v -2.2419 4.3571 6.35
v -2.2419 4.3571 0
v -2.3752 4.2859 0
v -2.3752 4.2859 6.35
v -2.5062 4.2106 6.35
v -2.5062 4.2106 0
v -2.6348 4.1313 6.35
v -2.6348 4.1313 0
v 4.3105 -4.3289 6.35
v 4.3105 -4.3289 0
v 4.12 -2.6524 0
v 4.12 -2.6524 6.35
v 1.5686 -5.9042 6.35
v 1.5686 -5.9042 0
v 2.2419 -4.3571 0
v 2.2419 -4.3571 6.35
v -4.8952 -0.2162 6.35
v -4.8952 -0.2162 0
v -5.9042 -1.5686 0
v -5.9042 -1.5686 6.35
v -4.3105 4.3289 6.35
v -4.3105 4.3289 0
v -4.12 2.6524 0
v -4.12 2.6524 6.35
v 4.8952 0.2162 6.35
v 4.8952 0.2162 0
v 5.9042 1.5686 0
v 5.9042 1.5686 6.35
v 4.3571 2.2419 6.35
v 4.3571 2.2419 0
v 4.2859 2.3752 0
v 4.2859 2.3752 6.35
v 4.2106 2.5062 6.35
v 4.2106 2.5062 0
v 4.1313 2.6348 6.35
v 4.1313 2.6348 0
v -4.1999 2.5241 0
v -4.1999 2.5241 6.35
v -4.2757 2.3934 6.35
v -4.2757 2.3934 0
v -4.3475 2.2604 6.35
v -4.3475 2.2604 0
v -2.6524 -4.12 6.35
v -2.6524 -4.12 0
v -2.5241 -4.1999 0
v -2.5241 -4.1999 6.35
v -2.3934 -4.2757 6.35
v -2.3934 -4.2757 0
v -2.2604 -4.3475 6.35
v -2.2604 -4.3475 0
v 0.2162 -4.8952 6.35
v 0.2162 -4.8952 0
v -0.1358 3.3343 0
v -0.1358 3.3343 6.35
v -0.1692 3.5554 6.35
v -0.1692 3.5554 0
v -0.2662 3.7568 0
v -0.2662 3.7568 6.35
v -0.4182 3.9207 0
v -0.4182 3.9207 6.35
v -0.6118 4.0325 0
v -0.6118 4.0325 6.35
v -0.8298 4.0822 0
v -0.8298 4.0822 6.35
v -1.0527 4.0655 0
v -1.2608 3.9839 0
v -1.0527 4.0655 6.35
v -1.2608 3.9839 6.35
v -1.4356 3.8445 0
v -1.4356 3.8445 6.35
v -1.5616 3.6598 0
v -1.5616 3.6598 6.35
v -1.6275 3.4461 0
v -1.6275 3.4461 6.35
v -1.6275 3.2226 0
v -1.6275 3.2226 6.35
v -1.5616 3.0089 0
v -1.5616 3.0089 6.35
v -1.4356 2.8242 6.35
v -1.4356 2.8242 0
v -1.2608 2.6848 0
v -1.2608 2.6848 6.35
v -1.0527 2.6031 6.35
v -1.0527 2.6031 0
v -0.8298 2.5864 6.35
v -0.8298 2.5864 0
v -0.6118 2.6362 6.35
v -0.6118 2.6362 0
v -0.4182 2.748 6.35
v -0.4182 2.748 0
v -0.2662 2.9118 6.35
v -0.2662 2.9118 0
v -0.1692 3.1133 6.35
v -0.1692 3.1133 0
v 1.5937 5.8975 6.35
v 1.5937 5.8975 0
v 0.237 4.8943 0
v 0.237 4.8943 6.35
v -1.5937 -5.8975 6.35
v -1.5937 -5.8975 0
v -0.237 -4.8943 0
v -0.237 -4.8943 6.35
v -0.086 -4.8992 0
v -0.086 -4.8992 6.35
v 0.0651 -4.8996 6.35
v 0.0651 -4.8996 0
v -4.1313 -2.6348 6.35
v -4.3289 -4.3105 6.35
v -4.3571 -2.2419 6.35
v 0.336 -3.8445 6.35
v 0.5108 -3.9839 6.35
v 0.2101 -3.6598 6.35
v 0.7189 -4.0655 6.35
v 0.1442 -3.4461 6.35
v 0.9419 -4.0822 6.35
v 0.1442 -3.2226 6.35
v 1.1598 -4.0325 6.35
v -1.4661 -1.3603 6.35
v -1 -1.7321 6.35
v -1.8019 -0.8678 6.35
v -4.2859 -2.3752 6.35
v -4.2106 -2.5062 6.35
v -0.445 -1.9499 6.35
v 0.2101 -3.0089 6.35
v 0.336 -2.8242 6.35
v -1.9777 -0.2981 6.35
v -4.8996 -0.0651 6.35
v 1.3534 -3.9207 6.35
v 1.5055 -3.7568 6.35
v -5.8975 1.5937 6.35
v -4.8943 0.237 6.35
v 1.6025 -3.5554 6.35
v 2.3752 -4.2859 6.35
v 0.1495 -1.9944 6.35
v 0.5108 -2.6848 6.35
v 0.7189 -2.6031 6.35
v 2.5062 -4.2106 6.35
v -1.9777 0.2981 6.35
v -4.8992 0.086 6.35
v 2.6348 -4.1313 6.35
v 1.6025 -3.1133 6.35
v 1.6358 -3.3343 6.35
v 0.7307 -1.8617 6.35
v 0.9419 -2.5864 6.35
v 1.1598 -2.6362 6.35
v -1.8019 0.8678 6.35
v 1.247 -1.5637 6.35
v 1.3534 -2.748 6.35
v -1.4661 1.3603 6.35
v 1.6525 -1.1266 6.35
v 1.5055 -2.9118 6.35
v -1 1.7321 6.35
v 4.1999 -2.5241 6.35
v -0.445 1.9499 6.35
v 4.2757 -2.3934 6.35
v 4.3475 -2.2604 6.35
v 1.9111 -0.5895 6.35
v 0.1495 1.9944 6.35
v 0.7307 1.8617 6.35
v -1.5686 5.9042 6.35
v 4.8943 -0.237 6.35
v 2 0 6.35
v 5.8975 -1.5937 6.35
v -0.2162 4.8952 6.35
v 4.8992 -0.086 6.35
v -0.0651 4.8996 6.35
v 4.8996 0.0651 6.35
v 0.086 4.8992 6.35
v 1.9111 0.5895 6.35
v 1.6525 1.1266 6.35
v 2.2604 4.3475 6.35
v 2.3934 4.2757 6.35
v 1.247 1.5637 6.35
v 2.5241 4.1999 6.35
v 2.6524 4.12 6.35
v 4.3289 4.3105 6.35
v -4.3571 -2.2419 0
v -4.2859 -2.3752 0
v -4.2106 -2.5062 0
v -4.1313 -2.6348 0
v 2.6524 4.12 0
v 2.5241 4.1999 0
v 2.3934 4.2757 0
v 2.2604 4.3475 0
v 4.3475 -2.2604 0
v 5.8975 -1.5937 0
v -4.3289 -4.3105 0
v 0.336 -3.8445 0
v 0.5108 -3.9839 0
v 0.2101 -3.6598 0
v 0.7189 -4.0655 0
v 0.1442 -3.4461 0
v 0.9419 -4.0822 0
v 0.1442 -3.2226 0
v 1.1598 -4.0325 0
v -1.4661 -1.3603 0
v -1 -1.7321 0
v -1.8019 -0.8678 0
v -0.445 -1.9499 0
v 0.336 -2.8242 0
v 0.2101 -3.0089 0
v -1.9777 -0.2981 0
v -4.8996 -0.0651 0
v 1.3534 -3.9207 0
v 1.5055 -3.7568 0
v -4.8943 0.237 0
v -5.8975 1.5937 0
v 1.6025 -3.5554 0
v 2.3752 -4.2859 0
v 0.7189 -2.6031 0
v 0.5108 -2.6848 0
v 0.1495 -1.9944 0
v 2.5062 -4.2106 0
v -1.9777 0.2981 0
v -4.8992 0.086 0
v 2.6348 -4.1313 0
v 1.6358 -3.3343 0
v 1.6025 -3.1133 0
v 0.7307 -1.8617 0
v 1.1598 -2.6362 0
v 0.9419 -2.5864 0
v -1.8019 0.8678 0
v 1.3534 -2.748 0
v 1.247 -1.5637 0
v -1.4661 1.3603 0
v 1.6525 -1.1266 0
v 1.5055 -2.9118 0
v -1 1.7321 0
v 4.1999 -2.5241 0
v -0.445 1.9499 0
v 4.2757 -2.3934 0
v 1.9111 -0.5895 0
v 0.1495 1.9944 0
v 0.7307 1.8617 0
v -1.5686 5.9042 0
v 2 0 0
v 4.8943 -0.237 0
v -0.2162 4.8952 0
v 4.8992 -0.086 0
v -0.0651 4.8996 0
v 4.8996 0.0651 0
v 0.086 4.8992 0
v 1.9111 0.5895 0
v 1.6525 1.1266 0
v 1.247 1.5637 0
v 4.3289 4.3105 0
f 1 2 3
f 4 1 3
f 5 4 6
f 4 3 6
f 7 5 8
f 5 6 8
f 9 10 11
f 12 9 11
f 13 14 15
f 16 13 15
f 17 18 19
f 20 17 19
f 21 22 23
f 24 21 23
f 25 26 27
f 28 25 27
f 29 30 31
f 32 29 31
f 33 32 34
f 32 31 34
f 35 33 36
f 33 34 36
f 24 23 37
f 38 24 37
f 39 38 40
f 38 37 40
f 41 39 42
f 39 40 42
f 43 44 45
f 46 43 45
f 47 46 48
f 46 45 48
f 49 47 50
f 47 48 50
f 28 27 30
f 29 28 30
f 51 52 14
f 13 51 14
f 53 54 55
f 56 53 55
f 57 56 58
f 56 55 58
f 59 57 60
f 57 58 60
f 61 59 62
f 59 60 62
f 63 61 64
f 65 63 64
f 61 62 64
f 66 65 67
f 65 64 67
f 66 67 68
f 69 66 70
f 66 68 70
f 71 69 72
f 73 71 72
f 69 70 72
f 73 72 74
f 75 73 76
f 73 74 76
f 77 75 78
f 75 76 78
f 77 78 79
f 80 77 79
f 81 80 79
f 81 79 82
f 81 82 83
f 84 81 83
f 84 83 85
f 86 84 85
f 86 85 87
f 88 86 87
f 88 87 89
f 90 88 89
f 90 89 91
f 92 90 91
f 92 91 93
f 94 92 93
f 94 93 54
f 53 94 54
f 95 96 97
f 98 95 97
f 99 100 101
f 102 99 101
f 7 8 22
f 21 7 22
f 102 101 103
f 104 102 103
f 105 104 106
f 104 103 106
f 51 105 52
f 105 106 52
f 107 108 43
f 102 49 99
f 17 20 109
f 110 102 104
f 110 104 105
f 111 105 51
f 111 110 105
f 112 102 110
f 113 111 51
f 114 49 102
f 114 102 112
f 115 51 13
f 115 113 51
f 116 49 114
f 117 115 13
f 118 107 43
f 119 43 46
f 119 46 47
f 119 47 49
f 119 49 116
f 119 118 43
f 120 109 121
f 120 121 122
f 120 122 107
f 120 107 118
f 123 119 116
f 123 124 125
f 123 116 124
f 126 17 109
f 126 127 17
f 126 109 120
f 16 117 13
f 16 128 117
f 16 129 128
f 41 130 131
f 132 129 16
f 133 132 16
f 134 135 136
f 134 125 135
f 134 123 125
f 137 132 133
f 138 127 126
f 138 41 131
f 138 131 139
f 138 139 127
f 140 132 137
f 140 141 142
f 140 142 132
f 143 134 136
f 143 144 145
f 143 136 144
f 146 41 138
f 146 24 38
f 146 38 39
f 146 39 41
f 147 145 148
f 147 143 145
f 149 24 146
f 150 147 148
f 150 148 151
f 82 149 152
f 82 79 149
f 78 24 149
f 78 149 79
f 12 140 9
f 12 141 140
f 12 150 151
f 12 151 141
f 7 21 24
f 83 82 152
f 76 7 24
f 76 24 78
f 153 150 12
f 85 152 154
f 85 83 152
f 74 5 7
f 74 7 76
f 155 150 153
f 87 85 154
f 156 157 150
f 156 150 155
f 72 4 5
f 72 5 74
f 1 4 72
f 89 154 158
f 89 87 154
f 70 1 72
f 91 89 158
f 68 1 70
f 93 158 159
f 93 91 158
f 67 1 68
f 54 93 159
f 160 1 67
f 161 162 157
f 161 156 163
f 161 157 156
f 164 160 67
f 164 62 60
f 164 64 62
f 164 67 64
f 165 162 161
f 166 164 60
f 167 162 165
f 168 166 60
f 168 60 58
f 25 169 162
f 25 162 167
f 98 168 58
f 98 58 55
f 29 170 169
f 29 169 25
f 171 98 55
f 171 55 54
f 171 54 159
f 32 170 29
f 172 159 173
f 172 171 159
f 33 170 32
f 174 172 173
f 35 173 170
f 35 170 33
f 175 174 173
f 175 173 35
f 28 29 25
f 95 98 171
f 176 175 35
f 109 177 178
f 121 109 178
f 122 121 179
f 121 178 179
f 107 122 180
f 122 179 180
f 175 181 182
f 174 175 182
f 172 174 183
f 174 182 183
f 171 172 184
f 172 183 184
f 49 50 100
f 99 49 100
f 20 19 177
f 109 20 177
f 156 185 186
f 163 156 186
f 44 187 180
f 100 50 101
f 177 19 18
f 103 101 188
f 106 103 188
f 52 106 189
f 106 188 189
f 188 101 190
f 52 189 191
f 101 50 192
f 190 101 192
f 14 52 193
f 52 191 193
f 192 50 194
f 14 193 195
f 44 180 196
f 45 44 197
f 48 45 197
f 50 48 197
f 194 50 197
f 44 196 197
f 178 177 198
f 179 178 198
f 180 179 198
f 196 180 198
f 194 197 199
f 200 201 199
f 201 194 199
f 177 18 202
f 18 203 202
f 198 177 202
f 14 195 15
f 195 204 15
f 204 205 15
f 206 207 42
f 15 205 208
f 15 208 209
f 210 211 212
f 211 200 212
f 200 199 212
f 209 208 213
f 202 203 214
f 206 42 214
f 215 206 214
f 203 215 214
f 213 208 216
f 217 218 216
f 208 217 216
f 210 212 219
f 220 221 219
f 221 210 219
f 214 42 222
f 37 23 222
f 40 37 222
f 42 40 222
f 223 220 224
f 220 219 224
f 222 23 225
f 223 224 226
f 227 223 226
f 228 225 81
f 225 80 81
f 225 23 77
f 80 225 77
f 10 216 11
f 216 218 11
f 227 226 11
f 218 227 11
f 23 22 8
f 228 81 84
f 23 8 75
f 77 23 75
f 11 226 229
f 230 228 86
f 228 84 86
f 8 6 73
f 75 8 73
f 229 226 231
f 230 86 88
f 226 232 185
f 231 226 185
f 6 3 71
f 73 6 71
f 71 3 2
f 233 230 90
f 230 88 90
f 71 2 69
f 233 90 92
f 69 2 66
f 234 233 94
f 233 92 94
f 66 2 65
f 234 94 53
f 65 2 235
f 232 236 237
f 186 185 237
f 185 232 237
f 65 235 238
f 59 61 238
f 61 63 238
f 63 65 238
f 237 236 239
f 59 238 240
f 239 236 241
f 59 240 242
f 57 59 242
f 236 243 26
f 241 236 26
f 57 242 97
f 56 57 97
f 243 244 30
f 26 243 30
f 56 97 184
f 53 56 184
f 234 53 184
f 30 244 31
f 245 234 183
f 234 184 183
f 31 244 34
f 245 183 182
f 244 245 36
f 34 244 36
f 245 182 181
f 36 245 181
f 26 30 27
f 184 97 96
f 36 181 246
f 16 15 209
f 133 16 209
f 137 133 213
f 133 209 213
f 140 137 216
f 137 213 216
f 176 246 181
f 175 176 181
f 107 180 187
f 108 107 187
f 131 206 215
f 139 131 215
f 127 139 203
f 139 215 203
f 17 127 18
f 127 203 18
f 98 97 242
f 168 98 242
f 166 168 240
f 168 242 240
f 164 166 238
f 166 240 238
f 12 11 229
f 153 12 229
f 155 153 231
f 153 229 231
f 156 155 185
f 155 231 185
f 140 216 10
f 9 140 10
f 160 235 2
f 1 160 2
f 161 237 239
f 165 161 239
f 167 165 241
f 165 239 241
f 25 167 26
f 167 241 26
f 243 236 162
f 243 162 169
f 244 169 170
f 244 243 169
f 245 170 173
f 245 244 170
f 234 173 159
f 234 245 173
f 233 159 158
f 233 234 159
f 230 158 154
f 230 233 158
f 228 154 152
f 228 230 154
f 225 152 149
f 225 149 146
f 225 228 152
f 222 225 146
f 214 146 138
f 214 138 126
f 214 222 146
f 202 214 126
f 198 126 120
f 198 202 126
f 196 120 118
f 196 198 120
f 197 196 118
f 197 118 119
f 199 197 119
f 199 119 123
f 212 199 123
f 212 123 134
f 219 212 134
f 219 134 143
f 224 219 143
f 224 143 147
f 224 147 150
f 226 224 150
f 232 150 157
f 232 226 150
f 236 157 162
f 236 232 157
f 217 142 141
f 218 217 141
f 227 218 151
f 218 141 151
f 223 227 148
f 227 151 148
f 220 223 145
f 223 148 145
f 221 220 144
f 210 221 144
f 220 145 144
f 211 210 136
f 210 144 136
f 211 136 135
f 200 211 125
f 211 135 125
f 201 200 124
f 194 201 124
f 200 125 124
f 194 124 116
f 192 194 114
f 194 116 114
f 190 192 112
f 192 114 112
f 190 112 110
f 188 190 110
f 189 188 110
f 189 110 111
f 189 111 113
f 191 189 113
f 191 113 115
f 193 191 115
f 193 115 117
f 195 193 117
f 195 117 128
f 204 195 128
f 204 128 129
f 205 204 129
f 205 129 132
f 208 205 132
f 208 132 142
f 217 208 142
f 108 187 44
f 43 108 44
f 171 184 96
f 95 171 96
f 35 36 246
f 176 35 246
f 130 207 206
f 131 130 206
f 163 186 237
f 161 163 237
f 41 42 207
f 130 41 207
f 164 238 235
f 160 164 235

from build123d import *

# Parameters (mm, degrees)
SKETCH2_R           = 2
BOSS_EXTRUDE1_DEPTH = 6.35
SKETCH3_R           = 0.75
CUT_EXTRUDE1_DEPTH  = 11.490061241


with BuildPart() as part:
    # Sketch2 → Boss-Extrude1 (new body)
    with BuildSketch(Plane.XY):
        with BuildLine():
            Line((-5.904188549, -1.568559405), (-4.357072845, -2.241855531))
            ThreePointArc((-4.357072845, -2.241855531), (-4.248730253, -2.44096113), (-4.131295421, -2.634843097))
            Line((-4.131295421, -2.634843097), (-4.328897569, -4.310506566))
            Line((-4.328897569, -4.310506566), (-2.652408005, -4.120040264))
            ThreePointArc((-2.652408005, -4.120040264), (-2.459027768, -4.238299475), (-2.260385237, -4.347488767))
            Line((-2.260385237, -4.347488767), (-1.593681982, -5.897456974))
            Line((-1.593681982, -5.897456974), (-0.237032582, -4.894263536))
            ThreePointArc((-0.237032582, -4.894263536), (-0.010430778, -4.899988898), (0.216193347, -4.895228333))
            Line((0.216193347, -4.895228333), (1.568559405, -5.904188549))
            Line((1.568559405, -5.904188549), (2.241855531, -4.357072845))
            ThreePointArc((2.241855531, -4.357072845), (2.44096113, -4.248730253), (2.634843097, -4.131295421))
            Line((2.634843097, -4.131295421), (4.310506566, -4.328897569))
            Line((4.310506566, -4.328897569), (4.120040264, -2.652408005))
            ThreePointArc((4.120040264, -2.652408005), (4.238299475, -2.459027768), (4.347488767, -2.260385237))
            Line((4.347488767, -2.260385237), (5.897456974, -1.593681982))
            Line((5.897456974, -1.593681982), (4.894263536, -0.237032582))
            ThreePointArc((4.894263536, -0.237032582), (4.899988898, -0.010430778), (4.895228333, 0.216193347))
            Line((4.895228333, 0.216193347), (5.904188549, 1.568559405))
            Line((5.904188549, 1.568559405), (4.357072845, 2.241855531))
            ThreePointArc((4.357072845, 2.241855531), (4.248730253, 2.44096113), (4.131295421, 2.634843097))
            Line((4.131295421, 2.634843097), (4.328897569, 4.310506566))
            Line((4.328897569, 4.310506566), (2.652408005, 4.120040264))
            ThreePointArc((2.652408005, 4.120040264), (2.459027768, 4.238299475), (2.260385237, 4.347488767))
            Line((2.260385237, 4.347488767), (1.593681982, 5.897456974))
            Line((1.593681982, 5.897456974), (0.237032582, 4.894263536))
            ThreePointArc((0.237032582, 4.894263536), (0.010430778, 4.899988898), (-0.216193347, 4.895228333))
            Line((-0.216193347, 4.895228333), (-1.568559405, 5.904188549))
            Line((-1.568559405, 5.904188549), (-2.241855531, 4.357072845))
            ThreePointArc((-2.241855531, 4.357072845), (-2.44096113, 4.248730253), (-2.634843097, 4.131295421))
            Line((-2.634843097, 4.131295421), (-4.310506566, 4.328897569))
            Line((-4.310506566, 4.328897569), (-4.120040264, 2.652408005))
            ThreePointArc((-4.120040264, 2.652408005), (-4.238299475, 2.459027768), (-4.347488767, 2.260385237))
            Line((-4.347488767, 2.260385237), (-5.897456974, 1.593681982))
            Line((-5.897456974, 1.593681982), (-4.894263536, 0.237032582))
            ThreePointArc((-4.894263536, 0.237032582), (-4.899988898, 0.010430778), (-4.895228333, -0.216193347))
            Line((-4.895228333, -0.216193347), (-5.904188549, -1.568559405))
        make_face()
        Circle(SKETCH2_R, mode=Mode.SUBTRACT)
    extrude(amount=BOSS_EXTRUDE1_DEPTH)

    # Sketch3 → Cut-Extrude1 (cut, through all)
    with BuildSketch(Plane.XY.offset(6.35)):
        with Locations((-0.885829808, 3.334337348)):
            Circle(SKETCH3_R)
        with Locations((0.885829808, -3.334337348)):
            Circle(SKETCH3_R)
    extrude(amount=-CUT_EXTRUDE1_DEPTH, mode=Mode.SUBTRACT)


solid = part.part
